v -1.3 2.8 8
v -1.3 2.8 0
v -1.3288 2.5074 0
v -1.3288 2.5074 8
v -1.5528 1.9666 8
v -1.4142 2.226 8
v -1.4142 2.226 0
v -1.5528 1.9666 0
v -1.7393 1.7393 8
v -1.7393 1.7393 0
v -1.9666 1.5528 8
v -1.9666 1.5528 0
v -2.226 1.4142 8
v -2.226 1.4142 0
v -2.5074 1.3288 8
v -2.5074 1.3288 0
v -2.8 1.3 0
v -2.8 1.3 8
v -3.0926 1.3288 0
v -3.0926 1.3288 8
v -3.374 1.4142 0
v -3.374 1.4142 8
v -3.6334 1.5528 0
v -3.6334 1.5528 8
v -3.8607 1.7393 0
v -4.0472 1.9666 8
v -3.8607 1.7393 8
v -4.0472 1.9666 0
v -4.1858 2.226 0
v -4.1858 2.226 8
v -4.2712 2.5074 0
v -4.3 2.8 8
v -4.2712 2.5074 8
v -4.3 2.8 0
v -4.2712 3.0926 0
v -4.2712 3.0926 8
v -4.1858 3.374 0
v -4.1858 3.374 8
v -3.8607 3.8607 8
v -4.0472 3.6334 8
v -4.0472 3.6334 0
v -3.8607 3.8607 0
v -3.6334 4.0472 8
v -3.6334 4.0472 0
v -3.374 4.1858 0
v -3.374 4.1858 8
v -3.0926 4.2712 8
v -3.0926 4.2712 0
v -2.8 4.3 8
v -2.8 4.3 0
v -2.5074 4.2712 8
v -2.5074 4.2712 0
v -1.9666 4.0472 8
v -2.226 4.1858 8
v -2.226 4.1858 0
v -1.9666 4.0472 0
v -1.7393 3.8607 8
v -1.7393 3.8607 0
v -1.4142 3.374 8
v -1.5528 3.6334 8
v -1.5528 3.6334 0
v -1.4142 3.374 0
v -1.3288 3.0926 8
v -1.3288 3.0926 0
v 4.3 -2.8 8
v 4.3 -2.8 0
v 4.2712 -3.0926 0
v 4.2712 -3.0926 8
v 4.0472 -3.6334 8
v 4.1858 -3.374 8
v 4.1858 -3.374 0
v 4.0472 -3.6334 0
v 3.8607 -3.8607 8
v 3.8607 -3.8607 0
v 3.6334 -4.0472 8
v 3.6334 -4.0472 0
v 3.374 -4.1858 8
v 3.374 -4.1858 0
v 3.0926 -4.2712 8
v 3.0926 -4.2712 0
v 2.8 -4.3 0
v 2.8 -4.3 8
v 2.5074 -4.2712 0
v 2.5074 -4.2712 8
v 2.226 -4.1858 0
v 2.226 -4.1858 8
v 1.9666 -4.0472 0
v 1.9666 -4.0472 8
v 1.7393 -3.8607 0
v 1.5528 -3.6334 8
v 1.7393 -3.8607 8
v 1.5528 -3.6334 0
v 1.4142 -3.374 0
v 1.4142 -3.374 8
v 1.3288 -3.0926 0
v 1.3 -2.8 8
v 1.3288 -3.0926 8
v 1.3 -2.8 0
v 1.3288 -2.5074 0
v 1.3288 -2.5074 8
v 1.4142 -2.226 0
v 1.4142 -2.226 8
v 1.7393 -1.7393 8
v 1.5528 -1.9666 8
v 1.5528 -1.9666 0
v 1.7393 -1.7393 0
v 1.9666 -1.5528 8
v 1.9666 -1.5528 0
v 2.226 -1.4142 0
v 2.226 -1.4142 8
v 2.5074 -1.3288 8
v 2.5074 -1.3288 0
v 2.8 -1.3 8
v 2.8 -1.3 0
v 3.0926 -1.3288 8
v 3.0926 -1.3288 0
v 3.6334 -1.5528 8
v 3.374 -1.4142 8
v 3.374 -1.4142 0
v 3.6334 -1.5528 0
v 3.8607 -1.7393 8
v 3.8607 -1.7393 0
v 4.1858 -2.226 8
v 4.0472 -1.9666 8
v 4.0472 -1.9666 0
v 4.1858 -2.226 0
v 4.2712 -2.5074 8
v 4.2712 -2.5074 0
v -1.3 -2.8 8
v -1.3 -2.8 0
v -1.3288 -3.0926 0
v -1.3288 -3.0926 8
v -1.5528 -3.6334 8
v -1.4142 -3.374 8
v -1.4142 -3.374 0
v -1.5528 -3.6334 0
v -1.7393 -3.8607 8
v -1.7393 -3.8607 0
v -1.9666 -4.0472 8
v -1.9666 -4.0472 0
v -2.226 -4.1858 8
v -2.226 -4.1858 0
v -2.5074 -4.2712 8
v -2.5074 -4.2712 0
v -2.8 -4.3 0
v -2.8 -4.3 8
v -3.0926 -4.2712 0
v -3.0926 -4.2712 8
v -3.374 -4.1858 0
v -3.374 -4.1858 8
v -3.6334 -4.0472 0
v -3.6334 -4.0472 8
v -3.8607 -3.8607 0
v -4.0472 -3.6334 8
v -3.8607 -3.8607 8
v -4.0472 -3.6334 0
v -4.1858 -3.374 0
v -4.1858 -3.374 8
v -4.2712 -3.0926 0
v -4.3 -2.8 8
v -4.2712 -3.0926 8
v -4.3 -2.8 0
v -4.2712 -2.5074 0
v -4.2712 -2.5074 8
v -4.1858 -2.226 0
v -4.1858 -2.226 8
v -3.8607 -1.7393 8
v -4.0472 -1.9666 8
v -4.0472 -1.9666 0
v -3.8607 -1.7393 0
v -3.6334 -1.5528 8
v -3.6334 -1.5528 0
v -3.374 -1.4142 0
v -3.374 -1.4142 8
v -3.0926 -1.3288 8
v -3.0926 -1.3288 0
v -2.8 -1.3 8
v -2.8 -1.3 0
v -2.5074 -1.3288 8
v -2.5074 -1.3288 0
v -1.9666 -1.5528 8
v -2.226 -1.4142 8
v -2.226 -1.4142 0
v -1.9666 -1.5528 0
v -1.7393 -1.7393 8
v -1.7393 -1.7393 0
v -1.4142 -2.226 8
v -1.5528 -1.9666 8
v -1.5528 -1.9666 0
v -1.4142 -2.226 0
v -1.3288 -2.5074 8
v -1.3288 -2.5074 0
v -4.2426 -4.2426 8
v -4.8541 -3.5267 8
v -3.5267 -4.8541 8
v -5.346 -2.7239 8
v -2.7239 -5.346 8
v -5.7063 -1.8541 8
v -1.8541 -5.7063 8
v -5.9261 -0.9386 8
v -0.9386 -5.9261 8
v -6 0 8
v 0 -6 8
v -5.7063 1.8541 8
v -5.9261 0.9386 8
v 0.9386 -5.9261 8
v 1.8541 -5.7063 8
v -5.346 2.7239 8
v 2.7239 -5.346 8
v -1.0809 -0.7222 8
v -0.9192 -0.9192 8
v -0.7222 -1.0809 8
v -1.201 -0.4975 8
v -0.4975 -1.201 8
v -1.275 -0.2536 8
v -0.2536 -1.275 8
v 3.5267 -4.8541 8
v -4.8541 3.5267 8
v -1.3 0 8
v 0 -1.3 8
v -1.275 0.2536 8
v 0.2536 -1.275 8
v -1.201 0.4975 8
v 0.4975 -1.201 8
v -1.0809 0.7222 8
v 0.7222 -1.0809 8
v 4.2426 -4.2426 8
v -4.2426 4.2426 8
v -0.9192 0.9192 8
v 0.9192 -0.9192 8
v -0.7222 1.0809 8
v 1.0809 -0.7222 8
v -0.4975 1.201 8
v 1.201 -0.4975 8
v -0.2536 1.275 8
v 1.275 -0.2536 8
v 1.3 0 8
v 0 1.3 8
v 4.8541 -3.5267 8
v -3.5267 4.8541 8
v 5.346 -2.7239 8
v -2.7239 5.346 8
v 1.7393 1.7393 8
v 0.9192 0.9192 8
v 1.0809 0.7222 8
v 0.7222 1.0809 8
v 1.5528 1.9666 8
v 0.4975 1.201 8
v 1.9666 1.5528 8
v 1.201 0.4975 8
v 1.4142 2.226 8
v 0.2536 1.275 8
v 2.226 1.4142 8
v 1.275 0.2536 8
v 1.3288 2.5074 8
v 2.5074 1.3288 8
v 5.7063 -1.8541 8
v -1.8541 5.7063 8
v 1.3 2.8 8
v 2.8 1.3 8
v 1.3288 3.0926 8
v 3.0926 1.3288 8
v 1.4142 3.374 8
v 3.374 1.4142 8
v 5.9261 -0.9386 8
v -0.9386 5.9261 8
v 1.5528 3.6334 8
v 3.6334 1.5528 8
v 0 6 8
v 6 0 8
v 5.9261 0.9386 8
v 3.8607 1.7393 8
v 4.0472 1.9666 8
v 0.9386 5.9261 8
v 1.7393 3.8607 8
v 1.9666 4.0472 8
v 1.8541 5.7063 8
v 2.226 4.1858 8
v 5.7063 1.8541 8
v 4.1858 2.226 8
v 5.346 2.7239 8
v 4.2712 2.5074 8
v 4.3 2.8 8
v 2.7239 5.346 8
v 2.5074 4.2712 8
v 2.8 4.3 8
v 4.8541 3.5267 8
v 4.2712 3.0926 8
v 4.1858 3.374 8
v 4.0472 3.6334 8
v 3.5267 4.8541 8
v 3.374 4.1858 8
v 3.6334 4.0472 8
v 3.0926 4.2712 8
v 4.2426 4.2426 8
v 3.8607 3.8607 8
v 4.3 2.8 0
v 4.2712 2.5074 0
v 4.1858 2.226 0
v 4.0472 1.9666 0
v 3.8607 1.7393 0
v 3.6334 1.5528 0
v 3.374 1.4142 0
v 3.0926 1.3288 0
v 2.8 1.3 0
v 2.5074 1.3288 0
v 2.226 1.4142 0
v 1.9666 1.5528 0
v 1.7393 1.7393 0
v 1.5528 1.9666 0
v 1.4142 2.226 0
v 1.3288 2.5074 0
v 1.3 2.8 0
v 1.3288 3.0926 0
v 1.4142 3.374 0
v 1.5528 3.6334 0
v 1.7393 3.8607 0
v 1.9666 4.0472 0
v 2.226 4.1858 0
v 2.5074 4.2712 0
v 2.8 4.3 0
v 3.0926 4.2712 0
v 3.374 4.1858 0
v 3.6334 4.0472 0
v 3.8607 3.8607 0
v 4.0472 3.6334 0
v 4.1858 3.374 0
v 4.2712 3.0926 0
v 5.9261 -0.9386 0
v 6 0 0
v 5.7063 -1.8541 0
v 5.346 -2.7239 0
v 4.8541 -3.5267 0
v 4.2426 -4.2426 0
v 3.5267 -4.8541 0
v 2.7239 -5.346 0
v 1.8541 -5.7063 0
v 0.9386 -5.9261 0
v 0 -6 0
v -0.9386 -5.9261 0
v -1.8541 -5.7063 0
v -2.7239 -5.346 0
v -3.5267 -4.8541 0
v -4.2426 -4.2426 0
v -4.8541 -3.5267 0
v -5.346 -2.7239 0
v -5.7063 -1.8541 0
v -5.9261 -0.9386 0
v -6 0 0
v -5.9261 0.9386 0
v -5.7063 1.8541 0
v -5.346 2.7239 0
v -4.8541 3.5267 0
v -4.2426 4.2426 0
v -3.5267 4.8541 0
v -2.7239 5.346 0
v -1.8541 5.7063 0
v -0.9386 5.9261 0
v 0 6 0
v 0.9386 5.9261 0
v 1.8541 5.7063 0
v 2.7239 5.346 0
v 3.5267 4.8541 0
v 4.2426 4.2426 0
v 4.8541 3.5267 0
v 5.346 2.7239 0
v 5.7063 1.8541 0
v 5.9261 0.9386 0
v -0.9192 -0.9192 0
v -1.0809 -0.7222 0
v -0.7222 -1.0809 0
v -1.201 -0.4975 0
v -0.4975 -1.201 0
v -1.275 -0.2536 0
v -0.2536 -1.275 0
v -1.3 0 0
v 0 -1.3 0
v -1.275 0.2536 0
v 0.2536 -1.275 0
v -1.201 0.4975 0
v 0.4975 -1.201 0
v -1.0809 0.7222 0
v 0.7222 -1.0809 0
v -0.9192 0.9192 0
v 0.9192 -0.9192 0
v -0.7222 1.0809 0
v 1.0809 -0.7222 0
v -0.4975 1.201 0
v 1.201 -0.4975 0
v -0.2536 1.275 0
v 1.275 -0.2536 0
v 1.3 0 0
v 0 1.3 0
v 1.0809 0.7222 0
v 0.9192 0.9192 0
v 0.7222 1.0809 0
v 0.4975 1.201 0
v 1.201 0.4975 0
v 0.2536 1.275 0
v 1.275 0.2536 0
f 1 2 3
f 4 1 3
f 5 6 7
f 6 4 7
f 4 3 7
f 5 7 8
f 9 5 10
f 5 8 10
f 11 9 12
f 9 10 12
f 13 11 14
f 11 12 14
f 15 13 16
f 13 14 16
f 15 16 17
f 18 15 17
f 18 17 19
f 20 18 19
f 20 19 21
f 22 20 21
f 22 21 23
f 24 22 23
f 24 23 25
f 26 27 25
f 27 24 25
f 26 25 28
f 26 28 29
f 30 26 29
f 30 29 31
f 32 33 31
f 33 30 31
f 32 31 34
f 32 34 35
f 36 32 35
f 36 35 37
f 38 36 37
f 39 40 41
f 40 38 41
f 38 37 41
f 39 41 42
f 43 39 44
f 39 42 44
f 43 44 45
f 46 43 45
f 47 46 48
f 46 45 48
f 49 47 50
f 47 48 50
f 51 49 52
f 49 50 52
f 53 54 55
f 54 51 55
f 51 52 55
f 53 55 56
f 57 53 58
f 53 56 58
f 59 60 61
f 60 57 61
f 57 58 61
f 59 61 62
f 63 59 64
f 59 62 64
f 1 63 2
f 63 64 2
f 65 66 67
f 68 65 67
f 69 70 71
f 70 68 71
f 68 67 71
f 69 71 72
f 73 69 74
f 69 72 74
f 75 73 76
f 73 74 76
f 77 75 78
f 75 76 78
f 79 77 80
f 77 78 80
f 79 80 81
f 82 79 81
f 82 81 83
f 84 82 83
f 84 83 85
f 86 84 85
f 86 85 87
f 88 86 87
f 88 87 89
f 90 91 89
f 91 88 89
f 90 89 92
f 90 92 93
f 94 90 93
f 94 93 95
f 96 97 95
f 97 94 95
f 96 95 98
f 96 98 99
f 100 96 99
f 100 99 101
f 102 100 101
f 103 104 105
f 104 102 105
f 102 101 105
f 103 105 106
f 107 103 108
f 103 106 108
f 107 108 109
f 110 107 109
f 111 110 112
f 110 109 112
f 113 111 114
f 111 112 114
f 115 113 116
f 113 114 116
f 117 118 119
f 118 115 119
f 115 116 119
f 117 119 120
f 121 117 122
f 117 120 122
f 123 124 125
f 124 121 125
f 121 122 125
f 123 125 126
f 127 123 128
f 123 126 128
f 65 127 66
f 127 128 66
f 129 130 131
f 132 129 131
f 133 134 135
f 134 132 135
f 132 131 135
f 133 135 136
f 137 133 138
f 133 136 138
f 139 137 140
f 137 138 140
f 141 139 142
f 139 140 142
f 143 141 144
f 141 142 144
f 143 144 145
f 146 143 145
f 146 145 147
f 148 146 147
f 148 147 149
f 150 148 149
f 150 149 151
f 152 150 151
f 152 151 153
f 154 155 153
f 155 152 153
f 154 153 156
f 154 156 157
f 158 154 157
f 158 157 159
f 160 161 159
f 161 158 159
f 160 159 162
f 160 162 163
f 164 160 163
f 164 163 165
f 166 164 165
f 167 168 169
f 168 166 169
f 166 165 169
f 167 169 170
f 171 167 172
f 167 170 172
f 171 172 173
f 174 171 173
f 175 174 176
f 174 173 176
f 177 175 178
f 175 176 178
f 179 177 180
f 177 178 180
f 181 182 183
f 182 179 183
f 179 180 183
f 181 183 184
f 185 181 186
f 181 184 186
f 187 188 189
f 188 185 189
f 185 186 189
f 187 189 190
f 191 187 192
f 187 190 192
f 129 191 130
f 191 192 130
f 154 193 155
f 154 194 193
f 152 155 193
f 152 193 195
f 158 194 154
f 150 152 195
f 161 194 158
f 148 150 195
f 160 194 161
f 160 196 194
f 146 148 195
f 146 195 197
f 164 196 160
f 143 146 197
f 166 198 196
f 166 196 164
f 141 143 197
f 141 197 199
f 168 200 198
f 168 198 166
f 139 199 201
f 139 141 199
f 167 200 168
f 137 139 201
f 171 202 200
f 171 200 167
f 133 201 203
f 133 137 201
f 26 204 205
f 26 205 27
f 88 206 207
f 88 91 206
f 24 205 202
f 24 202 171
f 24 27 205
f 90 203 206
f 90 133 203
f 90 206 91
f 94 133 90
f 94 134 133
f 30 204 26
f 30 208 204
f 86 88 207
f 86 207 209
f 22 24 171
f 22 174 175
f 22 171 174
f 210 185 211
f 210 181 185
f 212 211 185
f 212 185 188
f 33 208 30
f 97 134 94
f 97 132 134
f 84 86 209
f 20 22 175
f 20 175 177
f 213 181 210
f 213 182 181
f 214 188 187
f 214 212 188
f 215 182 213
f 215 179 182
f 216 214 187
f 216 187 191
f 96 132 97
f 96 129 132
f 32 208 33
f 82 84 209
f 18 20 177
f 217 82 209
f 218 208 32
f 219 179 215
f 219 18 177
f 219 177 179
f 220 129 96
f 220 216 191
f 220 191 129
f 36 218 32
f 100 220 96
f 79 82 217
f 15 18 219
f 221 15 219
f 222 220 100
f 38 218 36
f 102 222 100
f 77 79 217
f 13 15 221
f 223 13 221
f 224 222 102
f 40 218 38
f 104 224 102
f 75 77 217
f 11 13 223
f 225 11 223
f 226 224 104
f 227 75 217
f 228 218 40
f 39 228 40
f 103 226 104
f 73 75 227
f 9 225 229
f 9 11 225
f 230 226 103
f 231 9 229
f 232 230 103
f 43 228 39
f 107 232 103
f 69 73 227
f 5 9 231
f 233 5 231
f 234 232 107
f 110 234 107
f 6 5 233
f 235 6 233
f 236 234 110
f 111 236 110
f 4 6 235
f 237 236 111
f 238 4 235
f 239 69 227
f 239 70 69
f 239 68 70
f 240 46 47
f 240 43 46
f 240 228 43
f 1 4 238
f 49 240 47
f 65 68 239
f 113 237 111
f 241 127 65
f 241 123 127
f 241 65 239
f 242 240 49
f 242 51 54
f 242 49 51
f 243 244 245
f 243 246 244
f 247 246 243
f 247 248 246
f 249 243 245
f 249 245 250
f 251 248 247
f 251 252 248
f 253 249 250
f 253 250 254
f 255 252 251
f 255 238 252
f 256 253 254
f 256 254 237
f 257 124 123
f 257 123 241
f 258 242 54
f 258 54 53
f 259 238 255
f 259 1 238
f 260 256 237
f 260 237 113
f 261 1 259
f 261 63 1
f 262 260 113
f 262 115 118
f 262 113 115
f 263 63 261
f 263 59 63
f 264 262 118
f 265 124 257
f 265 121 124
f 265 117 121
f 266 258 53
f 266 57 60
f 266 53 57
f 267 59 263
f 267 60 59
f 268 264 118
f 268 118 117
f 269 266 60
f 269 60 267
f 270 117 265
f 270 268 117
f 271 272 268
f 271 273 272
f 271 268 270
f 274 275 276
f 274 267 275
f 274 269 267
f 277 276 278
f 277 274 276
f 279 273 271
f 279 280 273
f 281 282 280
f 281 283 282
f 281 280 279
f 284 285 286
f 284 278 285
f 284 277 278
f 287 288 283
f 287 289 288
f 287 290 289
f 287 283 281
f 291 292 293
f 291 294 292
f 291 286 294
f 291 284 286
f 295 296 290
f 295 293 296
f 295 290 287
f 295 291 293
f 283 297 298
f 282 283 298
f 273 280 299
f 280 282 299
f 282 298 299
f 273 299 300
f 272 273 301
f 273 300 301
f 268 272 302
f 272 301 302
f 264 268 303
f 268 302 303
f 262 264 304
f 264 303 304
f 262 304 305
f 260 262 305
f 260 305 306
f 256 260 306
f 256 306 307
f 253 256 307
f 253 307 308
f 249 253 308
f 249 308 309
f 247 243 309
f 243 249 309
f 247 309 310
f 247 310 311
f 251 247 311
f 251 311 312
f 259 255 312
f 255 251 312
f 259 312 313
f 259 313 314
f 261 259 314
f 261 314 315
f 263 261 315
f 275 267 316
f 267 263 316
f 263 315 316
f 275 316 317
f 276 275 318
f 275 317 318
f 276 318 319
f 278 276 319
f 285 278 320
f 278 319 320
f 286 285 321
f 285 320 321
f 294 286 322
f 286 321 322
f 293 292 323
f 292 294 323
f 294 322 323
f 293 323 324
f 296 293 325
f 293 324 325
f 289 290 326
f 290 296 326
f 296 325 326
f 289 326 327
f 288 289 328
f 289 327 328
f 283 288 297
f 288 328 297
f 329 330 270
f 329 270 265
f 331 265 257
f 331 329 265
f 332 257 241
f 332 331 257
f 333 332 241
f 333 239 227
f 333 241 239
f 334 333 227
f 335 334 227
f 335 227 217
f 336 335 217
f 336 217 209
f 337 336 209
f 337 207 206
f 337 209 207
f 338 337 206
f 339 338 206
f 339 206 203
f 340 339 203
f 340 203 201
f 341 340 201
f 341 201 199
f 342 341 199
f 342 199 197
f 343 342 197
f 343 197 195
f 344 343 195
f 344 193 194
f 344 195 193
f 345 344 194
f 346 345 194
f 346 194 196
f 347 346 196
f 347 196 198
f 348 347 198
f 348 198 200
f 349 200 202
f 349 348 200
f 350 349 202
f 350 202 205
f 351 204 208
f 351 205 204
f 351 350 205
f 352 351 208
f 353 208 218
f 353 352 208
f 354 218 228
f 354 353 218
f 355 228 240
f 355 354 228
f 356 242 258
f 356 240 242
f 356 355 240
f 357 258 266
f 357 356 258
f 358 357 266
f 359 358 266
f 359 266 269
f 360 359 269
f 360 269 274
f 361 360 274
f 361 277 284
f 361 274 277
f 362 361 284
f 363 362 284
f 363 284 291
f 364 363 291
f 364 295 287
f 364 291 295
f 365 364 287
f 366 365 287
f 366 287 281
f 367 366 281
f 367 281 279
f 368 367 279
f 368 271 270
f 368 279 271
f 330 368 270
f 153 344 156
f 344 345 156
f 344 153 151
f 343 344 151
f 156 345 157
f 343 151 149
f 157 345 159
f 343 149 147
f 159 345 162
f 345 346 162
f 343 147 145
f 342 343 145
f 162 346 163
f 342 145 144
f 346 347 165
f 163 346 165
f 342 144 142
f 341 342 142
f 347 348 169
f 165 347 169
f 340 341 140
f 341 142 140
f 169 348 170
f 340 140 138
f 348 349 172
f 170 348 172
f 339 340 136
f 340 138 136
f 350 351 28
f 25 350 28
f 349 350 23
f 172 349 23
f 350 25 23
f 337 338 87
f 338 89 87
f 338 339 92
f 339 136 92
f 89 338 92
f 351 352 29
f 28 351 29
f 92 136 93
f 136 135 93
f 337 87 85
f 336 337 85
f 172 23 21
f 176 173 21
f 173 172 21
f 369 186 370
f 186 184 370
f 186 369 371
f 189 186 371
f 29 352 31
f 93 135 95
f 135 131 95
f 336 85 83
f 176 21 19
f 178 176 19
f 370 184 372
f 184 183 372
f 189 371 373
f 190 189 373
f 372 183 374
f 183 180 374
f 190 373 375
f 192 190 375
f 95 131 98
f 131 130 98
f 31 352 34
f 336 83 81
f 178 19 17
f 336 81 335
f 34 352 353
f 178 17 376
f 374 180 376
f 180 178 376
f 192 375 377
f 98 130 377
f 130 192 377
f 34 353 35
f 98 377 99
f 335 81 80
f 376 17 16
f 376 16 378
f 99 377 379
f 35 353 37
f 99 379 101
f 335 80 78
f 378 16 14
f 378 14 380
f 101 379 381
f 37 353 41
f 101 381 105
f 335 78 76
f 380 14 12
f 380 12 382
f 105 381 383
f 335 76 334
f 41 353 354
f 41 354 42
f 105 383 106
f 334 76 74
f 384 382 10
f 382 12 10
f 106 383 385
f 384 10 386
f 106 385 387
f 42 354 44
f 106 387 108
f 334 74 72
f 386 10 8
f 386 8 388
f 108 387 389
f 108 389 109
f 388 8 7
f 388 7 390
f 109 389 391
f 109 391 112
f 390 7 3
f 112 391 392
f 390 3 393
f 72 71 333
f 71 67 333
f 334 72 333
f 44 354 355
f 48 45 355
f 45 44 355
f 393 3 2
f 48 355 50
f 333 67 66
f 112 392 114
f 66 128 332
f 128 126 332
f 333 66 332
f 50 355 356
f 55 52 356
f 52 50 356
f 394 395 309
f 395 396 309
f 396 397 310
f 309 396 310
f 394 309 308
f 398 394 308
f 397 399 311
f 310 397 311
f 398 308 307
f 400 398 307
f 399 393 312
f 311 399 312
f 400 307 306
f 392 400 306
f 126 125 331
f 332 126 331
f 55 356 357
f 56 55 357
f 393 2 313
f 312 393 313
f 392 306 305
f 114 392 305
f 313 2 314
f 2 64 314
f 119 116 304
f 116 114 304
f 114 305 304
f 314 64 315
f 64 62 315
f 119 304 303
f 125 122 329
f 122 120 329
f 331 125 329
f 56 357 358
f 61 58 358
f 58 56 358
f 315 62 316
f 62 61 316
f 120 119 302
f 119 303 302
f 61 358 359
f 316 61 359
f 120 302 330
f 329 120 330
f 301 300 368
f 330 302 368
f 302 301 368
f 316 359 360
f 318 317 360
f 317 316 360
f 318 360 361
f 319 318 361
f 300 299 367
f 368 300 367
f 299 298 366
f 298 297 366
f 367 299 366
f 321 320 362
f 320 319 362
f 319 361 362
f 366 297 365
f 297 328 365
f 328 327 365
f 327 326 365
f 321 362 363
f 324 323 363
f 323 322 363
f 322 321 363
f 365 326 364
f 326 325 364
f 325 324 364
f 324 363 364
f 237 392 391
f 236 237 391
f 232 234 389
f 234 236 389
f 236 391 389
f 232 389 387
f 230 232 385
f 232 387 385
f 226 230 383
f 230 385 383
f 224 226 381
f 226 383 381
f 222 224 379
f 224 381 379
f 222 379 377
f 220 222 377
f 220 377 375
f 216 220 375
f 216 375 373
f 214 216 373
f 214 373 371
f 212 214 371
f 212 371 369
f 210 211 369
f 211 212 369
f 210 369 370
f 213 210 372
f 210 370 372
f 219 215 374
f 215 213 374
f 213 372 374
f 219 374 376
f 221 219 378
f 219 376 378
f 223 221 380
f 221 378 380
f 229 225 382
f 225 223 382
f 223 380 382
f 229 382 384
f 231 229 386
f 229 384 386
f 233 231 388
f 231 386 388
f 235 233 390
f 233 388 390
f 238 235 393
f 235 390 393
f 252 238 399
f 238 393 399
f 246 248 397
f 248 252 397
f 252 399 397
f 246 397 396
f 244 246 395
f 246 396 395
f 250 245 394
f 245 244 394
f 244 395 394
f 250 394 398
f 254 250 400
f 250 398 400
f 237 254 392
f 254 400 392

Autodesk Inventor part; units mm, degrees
ref_plane "YZ Plane" through (0, 0, 0) normal (1, 0, 0) x (0, 1, 0)
ref_plane "XZ Plane" through (0, 0, 0) normal (0, 1, 0) x (-1, 0, 0)
ref_plane "XY Plane" through (0, 0, 0) normal (0, 0, 1) x (1, 0, 0)
sketch "スケッチ1" plane through (0, 0, 0) normal (0, 0, 1) x (1, 0, 0)
  line L0 (-2.8, 2.8) -> (2.8, 2.8) construction
  line L1 (2.8, 2.8) -> (2.8, -2.8) construction
  line L2 (2.8, -2.8) -> (-2.8, -2.8) construction
  line L3 (-2.8, -2.8) -> (-2.8, 2.8) construction
  circle A0 centre (-2.8, 2.8) radius 1.5
  circle A1 centre (2.8, 2.8) radius 1.5
  circle A2 centre (2.8, -2.8) radius 1.5
  circle A3 centre (-2.8, -2.8) radius 1.5
  circle A4 centre (0, 0) radius 1.3
  circle A5 centre (0, 0) radius 6
  dimension "d0" = 3
  dimension "d1" = 3
  dimension "d2" = 3
  dimension "d3" = 3
  dimension "d4" = 5.6
  dimension "d5" = 2.6
  dimension "d6" = 12
extrude "押し出し1" add sketch "スケッチ1" along normal blind 8
properties part number "脚最終段カム1" material "アルミニウム 7075"
